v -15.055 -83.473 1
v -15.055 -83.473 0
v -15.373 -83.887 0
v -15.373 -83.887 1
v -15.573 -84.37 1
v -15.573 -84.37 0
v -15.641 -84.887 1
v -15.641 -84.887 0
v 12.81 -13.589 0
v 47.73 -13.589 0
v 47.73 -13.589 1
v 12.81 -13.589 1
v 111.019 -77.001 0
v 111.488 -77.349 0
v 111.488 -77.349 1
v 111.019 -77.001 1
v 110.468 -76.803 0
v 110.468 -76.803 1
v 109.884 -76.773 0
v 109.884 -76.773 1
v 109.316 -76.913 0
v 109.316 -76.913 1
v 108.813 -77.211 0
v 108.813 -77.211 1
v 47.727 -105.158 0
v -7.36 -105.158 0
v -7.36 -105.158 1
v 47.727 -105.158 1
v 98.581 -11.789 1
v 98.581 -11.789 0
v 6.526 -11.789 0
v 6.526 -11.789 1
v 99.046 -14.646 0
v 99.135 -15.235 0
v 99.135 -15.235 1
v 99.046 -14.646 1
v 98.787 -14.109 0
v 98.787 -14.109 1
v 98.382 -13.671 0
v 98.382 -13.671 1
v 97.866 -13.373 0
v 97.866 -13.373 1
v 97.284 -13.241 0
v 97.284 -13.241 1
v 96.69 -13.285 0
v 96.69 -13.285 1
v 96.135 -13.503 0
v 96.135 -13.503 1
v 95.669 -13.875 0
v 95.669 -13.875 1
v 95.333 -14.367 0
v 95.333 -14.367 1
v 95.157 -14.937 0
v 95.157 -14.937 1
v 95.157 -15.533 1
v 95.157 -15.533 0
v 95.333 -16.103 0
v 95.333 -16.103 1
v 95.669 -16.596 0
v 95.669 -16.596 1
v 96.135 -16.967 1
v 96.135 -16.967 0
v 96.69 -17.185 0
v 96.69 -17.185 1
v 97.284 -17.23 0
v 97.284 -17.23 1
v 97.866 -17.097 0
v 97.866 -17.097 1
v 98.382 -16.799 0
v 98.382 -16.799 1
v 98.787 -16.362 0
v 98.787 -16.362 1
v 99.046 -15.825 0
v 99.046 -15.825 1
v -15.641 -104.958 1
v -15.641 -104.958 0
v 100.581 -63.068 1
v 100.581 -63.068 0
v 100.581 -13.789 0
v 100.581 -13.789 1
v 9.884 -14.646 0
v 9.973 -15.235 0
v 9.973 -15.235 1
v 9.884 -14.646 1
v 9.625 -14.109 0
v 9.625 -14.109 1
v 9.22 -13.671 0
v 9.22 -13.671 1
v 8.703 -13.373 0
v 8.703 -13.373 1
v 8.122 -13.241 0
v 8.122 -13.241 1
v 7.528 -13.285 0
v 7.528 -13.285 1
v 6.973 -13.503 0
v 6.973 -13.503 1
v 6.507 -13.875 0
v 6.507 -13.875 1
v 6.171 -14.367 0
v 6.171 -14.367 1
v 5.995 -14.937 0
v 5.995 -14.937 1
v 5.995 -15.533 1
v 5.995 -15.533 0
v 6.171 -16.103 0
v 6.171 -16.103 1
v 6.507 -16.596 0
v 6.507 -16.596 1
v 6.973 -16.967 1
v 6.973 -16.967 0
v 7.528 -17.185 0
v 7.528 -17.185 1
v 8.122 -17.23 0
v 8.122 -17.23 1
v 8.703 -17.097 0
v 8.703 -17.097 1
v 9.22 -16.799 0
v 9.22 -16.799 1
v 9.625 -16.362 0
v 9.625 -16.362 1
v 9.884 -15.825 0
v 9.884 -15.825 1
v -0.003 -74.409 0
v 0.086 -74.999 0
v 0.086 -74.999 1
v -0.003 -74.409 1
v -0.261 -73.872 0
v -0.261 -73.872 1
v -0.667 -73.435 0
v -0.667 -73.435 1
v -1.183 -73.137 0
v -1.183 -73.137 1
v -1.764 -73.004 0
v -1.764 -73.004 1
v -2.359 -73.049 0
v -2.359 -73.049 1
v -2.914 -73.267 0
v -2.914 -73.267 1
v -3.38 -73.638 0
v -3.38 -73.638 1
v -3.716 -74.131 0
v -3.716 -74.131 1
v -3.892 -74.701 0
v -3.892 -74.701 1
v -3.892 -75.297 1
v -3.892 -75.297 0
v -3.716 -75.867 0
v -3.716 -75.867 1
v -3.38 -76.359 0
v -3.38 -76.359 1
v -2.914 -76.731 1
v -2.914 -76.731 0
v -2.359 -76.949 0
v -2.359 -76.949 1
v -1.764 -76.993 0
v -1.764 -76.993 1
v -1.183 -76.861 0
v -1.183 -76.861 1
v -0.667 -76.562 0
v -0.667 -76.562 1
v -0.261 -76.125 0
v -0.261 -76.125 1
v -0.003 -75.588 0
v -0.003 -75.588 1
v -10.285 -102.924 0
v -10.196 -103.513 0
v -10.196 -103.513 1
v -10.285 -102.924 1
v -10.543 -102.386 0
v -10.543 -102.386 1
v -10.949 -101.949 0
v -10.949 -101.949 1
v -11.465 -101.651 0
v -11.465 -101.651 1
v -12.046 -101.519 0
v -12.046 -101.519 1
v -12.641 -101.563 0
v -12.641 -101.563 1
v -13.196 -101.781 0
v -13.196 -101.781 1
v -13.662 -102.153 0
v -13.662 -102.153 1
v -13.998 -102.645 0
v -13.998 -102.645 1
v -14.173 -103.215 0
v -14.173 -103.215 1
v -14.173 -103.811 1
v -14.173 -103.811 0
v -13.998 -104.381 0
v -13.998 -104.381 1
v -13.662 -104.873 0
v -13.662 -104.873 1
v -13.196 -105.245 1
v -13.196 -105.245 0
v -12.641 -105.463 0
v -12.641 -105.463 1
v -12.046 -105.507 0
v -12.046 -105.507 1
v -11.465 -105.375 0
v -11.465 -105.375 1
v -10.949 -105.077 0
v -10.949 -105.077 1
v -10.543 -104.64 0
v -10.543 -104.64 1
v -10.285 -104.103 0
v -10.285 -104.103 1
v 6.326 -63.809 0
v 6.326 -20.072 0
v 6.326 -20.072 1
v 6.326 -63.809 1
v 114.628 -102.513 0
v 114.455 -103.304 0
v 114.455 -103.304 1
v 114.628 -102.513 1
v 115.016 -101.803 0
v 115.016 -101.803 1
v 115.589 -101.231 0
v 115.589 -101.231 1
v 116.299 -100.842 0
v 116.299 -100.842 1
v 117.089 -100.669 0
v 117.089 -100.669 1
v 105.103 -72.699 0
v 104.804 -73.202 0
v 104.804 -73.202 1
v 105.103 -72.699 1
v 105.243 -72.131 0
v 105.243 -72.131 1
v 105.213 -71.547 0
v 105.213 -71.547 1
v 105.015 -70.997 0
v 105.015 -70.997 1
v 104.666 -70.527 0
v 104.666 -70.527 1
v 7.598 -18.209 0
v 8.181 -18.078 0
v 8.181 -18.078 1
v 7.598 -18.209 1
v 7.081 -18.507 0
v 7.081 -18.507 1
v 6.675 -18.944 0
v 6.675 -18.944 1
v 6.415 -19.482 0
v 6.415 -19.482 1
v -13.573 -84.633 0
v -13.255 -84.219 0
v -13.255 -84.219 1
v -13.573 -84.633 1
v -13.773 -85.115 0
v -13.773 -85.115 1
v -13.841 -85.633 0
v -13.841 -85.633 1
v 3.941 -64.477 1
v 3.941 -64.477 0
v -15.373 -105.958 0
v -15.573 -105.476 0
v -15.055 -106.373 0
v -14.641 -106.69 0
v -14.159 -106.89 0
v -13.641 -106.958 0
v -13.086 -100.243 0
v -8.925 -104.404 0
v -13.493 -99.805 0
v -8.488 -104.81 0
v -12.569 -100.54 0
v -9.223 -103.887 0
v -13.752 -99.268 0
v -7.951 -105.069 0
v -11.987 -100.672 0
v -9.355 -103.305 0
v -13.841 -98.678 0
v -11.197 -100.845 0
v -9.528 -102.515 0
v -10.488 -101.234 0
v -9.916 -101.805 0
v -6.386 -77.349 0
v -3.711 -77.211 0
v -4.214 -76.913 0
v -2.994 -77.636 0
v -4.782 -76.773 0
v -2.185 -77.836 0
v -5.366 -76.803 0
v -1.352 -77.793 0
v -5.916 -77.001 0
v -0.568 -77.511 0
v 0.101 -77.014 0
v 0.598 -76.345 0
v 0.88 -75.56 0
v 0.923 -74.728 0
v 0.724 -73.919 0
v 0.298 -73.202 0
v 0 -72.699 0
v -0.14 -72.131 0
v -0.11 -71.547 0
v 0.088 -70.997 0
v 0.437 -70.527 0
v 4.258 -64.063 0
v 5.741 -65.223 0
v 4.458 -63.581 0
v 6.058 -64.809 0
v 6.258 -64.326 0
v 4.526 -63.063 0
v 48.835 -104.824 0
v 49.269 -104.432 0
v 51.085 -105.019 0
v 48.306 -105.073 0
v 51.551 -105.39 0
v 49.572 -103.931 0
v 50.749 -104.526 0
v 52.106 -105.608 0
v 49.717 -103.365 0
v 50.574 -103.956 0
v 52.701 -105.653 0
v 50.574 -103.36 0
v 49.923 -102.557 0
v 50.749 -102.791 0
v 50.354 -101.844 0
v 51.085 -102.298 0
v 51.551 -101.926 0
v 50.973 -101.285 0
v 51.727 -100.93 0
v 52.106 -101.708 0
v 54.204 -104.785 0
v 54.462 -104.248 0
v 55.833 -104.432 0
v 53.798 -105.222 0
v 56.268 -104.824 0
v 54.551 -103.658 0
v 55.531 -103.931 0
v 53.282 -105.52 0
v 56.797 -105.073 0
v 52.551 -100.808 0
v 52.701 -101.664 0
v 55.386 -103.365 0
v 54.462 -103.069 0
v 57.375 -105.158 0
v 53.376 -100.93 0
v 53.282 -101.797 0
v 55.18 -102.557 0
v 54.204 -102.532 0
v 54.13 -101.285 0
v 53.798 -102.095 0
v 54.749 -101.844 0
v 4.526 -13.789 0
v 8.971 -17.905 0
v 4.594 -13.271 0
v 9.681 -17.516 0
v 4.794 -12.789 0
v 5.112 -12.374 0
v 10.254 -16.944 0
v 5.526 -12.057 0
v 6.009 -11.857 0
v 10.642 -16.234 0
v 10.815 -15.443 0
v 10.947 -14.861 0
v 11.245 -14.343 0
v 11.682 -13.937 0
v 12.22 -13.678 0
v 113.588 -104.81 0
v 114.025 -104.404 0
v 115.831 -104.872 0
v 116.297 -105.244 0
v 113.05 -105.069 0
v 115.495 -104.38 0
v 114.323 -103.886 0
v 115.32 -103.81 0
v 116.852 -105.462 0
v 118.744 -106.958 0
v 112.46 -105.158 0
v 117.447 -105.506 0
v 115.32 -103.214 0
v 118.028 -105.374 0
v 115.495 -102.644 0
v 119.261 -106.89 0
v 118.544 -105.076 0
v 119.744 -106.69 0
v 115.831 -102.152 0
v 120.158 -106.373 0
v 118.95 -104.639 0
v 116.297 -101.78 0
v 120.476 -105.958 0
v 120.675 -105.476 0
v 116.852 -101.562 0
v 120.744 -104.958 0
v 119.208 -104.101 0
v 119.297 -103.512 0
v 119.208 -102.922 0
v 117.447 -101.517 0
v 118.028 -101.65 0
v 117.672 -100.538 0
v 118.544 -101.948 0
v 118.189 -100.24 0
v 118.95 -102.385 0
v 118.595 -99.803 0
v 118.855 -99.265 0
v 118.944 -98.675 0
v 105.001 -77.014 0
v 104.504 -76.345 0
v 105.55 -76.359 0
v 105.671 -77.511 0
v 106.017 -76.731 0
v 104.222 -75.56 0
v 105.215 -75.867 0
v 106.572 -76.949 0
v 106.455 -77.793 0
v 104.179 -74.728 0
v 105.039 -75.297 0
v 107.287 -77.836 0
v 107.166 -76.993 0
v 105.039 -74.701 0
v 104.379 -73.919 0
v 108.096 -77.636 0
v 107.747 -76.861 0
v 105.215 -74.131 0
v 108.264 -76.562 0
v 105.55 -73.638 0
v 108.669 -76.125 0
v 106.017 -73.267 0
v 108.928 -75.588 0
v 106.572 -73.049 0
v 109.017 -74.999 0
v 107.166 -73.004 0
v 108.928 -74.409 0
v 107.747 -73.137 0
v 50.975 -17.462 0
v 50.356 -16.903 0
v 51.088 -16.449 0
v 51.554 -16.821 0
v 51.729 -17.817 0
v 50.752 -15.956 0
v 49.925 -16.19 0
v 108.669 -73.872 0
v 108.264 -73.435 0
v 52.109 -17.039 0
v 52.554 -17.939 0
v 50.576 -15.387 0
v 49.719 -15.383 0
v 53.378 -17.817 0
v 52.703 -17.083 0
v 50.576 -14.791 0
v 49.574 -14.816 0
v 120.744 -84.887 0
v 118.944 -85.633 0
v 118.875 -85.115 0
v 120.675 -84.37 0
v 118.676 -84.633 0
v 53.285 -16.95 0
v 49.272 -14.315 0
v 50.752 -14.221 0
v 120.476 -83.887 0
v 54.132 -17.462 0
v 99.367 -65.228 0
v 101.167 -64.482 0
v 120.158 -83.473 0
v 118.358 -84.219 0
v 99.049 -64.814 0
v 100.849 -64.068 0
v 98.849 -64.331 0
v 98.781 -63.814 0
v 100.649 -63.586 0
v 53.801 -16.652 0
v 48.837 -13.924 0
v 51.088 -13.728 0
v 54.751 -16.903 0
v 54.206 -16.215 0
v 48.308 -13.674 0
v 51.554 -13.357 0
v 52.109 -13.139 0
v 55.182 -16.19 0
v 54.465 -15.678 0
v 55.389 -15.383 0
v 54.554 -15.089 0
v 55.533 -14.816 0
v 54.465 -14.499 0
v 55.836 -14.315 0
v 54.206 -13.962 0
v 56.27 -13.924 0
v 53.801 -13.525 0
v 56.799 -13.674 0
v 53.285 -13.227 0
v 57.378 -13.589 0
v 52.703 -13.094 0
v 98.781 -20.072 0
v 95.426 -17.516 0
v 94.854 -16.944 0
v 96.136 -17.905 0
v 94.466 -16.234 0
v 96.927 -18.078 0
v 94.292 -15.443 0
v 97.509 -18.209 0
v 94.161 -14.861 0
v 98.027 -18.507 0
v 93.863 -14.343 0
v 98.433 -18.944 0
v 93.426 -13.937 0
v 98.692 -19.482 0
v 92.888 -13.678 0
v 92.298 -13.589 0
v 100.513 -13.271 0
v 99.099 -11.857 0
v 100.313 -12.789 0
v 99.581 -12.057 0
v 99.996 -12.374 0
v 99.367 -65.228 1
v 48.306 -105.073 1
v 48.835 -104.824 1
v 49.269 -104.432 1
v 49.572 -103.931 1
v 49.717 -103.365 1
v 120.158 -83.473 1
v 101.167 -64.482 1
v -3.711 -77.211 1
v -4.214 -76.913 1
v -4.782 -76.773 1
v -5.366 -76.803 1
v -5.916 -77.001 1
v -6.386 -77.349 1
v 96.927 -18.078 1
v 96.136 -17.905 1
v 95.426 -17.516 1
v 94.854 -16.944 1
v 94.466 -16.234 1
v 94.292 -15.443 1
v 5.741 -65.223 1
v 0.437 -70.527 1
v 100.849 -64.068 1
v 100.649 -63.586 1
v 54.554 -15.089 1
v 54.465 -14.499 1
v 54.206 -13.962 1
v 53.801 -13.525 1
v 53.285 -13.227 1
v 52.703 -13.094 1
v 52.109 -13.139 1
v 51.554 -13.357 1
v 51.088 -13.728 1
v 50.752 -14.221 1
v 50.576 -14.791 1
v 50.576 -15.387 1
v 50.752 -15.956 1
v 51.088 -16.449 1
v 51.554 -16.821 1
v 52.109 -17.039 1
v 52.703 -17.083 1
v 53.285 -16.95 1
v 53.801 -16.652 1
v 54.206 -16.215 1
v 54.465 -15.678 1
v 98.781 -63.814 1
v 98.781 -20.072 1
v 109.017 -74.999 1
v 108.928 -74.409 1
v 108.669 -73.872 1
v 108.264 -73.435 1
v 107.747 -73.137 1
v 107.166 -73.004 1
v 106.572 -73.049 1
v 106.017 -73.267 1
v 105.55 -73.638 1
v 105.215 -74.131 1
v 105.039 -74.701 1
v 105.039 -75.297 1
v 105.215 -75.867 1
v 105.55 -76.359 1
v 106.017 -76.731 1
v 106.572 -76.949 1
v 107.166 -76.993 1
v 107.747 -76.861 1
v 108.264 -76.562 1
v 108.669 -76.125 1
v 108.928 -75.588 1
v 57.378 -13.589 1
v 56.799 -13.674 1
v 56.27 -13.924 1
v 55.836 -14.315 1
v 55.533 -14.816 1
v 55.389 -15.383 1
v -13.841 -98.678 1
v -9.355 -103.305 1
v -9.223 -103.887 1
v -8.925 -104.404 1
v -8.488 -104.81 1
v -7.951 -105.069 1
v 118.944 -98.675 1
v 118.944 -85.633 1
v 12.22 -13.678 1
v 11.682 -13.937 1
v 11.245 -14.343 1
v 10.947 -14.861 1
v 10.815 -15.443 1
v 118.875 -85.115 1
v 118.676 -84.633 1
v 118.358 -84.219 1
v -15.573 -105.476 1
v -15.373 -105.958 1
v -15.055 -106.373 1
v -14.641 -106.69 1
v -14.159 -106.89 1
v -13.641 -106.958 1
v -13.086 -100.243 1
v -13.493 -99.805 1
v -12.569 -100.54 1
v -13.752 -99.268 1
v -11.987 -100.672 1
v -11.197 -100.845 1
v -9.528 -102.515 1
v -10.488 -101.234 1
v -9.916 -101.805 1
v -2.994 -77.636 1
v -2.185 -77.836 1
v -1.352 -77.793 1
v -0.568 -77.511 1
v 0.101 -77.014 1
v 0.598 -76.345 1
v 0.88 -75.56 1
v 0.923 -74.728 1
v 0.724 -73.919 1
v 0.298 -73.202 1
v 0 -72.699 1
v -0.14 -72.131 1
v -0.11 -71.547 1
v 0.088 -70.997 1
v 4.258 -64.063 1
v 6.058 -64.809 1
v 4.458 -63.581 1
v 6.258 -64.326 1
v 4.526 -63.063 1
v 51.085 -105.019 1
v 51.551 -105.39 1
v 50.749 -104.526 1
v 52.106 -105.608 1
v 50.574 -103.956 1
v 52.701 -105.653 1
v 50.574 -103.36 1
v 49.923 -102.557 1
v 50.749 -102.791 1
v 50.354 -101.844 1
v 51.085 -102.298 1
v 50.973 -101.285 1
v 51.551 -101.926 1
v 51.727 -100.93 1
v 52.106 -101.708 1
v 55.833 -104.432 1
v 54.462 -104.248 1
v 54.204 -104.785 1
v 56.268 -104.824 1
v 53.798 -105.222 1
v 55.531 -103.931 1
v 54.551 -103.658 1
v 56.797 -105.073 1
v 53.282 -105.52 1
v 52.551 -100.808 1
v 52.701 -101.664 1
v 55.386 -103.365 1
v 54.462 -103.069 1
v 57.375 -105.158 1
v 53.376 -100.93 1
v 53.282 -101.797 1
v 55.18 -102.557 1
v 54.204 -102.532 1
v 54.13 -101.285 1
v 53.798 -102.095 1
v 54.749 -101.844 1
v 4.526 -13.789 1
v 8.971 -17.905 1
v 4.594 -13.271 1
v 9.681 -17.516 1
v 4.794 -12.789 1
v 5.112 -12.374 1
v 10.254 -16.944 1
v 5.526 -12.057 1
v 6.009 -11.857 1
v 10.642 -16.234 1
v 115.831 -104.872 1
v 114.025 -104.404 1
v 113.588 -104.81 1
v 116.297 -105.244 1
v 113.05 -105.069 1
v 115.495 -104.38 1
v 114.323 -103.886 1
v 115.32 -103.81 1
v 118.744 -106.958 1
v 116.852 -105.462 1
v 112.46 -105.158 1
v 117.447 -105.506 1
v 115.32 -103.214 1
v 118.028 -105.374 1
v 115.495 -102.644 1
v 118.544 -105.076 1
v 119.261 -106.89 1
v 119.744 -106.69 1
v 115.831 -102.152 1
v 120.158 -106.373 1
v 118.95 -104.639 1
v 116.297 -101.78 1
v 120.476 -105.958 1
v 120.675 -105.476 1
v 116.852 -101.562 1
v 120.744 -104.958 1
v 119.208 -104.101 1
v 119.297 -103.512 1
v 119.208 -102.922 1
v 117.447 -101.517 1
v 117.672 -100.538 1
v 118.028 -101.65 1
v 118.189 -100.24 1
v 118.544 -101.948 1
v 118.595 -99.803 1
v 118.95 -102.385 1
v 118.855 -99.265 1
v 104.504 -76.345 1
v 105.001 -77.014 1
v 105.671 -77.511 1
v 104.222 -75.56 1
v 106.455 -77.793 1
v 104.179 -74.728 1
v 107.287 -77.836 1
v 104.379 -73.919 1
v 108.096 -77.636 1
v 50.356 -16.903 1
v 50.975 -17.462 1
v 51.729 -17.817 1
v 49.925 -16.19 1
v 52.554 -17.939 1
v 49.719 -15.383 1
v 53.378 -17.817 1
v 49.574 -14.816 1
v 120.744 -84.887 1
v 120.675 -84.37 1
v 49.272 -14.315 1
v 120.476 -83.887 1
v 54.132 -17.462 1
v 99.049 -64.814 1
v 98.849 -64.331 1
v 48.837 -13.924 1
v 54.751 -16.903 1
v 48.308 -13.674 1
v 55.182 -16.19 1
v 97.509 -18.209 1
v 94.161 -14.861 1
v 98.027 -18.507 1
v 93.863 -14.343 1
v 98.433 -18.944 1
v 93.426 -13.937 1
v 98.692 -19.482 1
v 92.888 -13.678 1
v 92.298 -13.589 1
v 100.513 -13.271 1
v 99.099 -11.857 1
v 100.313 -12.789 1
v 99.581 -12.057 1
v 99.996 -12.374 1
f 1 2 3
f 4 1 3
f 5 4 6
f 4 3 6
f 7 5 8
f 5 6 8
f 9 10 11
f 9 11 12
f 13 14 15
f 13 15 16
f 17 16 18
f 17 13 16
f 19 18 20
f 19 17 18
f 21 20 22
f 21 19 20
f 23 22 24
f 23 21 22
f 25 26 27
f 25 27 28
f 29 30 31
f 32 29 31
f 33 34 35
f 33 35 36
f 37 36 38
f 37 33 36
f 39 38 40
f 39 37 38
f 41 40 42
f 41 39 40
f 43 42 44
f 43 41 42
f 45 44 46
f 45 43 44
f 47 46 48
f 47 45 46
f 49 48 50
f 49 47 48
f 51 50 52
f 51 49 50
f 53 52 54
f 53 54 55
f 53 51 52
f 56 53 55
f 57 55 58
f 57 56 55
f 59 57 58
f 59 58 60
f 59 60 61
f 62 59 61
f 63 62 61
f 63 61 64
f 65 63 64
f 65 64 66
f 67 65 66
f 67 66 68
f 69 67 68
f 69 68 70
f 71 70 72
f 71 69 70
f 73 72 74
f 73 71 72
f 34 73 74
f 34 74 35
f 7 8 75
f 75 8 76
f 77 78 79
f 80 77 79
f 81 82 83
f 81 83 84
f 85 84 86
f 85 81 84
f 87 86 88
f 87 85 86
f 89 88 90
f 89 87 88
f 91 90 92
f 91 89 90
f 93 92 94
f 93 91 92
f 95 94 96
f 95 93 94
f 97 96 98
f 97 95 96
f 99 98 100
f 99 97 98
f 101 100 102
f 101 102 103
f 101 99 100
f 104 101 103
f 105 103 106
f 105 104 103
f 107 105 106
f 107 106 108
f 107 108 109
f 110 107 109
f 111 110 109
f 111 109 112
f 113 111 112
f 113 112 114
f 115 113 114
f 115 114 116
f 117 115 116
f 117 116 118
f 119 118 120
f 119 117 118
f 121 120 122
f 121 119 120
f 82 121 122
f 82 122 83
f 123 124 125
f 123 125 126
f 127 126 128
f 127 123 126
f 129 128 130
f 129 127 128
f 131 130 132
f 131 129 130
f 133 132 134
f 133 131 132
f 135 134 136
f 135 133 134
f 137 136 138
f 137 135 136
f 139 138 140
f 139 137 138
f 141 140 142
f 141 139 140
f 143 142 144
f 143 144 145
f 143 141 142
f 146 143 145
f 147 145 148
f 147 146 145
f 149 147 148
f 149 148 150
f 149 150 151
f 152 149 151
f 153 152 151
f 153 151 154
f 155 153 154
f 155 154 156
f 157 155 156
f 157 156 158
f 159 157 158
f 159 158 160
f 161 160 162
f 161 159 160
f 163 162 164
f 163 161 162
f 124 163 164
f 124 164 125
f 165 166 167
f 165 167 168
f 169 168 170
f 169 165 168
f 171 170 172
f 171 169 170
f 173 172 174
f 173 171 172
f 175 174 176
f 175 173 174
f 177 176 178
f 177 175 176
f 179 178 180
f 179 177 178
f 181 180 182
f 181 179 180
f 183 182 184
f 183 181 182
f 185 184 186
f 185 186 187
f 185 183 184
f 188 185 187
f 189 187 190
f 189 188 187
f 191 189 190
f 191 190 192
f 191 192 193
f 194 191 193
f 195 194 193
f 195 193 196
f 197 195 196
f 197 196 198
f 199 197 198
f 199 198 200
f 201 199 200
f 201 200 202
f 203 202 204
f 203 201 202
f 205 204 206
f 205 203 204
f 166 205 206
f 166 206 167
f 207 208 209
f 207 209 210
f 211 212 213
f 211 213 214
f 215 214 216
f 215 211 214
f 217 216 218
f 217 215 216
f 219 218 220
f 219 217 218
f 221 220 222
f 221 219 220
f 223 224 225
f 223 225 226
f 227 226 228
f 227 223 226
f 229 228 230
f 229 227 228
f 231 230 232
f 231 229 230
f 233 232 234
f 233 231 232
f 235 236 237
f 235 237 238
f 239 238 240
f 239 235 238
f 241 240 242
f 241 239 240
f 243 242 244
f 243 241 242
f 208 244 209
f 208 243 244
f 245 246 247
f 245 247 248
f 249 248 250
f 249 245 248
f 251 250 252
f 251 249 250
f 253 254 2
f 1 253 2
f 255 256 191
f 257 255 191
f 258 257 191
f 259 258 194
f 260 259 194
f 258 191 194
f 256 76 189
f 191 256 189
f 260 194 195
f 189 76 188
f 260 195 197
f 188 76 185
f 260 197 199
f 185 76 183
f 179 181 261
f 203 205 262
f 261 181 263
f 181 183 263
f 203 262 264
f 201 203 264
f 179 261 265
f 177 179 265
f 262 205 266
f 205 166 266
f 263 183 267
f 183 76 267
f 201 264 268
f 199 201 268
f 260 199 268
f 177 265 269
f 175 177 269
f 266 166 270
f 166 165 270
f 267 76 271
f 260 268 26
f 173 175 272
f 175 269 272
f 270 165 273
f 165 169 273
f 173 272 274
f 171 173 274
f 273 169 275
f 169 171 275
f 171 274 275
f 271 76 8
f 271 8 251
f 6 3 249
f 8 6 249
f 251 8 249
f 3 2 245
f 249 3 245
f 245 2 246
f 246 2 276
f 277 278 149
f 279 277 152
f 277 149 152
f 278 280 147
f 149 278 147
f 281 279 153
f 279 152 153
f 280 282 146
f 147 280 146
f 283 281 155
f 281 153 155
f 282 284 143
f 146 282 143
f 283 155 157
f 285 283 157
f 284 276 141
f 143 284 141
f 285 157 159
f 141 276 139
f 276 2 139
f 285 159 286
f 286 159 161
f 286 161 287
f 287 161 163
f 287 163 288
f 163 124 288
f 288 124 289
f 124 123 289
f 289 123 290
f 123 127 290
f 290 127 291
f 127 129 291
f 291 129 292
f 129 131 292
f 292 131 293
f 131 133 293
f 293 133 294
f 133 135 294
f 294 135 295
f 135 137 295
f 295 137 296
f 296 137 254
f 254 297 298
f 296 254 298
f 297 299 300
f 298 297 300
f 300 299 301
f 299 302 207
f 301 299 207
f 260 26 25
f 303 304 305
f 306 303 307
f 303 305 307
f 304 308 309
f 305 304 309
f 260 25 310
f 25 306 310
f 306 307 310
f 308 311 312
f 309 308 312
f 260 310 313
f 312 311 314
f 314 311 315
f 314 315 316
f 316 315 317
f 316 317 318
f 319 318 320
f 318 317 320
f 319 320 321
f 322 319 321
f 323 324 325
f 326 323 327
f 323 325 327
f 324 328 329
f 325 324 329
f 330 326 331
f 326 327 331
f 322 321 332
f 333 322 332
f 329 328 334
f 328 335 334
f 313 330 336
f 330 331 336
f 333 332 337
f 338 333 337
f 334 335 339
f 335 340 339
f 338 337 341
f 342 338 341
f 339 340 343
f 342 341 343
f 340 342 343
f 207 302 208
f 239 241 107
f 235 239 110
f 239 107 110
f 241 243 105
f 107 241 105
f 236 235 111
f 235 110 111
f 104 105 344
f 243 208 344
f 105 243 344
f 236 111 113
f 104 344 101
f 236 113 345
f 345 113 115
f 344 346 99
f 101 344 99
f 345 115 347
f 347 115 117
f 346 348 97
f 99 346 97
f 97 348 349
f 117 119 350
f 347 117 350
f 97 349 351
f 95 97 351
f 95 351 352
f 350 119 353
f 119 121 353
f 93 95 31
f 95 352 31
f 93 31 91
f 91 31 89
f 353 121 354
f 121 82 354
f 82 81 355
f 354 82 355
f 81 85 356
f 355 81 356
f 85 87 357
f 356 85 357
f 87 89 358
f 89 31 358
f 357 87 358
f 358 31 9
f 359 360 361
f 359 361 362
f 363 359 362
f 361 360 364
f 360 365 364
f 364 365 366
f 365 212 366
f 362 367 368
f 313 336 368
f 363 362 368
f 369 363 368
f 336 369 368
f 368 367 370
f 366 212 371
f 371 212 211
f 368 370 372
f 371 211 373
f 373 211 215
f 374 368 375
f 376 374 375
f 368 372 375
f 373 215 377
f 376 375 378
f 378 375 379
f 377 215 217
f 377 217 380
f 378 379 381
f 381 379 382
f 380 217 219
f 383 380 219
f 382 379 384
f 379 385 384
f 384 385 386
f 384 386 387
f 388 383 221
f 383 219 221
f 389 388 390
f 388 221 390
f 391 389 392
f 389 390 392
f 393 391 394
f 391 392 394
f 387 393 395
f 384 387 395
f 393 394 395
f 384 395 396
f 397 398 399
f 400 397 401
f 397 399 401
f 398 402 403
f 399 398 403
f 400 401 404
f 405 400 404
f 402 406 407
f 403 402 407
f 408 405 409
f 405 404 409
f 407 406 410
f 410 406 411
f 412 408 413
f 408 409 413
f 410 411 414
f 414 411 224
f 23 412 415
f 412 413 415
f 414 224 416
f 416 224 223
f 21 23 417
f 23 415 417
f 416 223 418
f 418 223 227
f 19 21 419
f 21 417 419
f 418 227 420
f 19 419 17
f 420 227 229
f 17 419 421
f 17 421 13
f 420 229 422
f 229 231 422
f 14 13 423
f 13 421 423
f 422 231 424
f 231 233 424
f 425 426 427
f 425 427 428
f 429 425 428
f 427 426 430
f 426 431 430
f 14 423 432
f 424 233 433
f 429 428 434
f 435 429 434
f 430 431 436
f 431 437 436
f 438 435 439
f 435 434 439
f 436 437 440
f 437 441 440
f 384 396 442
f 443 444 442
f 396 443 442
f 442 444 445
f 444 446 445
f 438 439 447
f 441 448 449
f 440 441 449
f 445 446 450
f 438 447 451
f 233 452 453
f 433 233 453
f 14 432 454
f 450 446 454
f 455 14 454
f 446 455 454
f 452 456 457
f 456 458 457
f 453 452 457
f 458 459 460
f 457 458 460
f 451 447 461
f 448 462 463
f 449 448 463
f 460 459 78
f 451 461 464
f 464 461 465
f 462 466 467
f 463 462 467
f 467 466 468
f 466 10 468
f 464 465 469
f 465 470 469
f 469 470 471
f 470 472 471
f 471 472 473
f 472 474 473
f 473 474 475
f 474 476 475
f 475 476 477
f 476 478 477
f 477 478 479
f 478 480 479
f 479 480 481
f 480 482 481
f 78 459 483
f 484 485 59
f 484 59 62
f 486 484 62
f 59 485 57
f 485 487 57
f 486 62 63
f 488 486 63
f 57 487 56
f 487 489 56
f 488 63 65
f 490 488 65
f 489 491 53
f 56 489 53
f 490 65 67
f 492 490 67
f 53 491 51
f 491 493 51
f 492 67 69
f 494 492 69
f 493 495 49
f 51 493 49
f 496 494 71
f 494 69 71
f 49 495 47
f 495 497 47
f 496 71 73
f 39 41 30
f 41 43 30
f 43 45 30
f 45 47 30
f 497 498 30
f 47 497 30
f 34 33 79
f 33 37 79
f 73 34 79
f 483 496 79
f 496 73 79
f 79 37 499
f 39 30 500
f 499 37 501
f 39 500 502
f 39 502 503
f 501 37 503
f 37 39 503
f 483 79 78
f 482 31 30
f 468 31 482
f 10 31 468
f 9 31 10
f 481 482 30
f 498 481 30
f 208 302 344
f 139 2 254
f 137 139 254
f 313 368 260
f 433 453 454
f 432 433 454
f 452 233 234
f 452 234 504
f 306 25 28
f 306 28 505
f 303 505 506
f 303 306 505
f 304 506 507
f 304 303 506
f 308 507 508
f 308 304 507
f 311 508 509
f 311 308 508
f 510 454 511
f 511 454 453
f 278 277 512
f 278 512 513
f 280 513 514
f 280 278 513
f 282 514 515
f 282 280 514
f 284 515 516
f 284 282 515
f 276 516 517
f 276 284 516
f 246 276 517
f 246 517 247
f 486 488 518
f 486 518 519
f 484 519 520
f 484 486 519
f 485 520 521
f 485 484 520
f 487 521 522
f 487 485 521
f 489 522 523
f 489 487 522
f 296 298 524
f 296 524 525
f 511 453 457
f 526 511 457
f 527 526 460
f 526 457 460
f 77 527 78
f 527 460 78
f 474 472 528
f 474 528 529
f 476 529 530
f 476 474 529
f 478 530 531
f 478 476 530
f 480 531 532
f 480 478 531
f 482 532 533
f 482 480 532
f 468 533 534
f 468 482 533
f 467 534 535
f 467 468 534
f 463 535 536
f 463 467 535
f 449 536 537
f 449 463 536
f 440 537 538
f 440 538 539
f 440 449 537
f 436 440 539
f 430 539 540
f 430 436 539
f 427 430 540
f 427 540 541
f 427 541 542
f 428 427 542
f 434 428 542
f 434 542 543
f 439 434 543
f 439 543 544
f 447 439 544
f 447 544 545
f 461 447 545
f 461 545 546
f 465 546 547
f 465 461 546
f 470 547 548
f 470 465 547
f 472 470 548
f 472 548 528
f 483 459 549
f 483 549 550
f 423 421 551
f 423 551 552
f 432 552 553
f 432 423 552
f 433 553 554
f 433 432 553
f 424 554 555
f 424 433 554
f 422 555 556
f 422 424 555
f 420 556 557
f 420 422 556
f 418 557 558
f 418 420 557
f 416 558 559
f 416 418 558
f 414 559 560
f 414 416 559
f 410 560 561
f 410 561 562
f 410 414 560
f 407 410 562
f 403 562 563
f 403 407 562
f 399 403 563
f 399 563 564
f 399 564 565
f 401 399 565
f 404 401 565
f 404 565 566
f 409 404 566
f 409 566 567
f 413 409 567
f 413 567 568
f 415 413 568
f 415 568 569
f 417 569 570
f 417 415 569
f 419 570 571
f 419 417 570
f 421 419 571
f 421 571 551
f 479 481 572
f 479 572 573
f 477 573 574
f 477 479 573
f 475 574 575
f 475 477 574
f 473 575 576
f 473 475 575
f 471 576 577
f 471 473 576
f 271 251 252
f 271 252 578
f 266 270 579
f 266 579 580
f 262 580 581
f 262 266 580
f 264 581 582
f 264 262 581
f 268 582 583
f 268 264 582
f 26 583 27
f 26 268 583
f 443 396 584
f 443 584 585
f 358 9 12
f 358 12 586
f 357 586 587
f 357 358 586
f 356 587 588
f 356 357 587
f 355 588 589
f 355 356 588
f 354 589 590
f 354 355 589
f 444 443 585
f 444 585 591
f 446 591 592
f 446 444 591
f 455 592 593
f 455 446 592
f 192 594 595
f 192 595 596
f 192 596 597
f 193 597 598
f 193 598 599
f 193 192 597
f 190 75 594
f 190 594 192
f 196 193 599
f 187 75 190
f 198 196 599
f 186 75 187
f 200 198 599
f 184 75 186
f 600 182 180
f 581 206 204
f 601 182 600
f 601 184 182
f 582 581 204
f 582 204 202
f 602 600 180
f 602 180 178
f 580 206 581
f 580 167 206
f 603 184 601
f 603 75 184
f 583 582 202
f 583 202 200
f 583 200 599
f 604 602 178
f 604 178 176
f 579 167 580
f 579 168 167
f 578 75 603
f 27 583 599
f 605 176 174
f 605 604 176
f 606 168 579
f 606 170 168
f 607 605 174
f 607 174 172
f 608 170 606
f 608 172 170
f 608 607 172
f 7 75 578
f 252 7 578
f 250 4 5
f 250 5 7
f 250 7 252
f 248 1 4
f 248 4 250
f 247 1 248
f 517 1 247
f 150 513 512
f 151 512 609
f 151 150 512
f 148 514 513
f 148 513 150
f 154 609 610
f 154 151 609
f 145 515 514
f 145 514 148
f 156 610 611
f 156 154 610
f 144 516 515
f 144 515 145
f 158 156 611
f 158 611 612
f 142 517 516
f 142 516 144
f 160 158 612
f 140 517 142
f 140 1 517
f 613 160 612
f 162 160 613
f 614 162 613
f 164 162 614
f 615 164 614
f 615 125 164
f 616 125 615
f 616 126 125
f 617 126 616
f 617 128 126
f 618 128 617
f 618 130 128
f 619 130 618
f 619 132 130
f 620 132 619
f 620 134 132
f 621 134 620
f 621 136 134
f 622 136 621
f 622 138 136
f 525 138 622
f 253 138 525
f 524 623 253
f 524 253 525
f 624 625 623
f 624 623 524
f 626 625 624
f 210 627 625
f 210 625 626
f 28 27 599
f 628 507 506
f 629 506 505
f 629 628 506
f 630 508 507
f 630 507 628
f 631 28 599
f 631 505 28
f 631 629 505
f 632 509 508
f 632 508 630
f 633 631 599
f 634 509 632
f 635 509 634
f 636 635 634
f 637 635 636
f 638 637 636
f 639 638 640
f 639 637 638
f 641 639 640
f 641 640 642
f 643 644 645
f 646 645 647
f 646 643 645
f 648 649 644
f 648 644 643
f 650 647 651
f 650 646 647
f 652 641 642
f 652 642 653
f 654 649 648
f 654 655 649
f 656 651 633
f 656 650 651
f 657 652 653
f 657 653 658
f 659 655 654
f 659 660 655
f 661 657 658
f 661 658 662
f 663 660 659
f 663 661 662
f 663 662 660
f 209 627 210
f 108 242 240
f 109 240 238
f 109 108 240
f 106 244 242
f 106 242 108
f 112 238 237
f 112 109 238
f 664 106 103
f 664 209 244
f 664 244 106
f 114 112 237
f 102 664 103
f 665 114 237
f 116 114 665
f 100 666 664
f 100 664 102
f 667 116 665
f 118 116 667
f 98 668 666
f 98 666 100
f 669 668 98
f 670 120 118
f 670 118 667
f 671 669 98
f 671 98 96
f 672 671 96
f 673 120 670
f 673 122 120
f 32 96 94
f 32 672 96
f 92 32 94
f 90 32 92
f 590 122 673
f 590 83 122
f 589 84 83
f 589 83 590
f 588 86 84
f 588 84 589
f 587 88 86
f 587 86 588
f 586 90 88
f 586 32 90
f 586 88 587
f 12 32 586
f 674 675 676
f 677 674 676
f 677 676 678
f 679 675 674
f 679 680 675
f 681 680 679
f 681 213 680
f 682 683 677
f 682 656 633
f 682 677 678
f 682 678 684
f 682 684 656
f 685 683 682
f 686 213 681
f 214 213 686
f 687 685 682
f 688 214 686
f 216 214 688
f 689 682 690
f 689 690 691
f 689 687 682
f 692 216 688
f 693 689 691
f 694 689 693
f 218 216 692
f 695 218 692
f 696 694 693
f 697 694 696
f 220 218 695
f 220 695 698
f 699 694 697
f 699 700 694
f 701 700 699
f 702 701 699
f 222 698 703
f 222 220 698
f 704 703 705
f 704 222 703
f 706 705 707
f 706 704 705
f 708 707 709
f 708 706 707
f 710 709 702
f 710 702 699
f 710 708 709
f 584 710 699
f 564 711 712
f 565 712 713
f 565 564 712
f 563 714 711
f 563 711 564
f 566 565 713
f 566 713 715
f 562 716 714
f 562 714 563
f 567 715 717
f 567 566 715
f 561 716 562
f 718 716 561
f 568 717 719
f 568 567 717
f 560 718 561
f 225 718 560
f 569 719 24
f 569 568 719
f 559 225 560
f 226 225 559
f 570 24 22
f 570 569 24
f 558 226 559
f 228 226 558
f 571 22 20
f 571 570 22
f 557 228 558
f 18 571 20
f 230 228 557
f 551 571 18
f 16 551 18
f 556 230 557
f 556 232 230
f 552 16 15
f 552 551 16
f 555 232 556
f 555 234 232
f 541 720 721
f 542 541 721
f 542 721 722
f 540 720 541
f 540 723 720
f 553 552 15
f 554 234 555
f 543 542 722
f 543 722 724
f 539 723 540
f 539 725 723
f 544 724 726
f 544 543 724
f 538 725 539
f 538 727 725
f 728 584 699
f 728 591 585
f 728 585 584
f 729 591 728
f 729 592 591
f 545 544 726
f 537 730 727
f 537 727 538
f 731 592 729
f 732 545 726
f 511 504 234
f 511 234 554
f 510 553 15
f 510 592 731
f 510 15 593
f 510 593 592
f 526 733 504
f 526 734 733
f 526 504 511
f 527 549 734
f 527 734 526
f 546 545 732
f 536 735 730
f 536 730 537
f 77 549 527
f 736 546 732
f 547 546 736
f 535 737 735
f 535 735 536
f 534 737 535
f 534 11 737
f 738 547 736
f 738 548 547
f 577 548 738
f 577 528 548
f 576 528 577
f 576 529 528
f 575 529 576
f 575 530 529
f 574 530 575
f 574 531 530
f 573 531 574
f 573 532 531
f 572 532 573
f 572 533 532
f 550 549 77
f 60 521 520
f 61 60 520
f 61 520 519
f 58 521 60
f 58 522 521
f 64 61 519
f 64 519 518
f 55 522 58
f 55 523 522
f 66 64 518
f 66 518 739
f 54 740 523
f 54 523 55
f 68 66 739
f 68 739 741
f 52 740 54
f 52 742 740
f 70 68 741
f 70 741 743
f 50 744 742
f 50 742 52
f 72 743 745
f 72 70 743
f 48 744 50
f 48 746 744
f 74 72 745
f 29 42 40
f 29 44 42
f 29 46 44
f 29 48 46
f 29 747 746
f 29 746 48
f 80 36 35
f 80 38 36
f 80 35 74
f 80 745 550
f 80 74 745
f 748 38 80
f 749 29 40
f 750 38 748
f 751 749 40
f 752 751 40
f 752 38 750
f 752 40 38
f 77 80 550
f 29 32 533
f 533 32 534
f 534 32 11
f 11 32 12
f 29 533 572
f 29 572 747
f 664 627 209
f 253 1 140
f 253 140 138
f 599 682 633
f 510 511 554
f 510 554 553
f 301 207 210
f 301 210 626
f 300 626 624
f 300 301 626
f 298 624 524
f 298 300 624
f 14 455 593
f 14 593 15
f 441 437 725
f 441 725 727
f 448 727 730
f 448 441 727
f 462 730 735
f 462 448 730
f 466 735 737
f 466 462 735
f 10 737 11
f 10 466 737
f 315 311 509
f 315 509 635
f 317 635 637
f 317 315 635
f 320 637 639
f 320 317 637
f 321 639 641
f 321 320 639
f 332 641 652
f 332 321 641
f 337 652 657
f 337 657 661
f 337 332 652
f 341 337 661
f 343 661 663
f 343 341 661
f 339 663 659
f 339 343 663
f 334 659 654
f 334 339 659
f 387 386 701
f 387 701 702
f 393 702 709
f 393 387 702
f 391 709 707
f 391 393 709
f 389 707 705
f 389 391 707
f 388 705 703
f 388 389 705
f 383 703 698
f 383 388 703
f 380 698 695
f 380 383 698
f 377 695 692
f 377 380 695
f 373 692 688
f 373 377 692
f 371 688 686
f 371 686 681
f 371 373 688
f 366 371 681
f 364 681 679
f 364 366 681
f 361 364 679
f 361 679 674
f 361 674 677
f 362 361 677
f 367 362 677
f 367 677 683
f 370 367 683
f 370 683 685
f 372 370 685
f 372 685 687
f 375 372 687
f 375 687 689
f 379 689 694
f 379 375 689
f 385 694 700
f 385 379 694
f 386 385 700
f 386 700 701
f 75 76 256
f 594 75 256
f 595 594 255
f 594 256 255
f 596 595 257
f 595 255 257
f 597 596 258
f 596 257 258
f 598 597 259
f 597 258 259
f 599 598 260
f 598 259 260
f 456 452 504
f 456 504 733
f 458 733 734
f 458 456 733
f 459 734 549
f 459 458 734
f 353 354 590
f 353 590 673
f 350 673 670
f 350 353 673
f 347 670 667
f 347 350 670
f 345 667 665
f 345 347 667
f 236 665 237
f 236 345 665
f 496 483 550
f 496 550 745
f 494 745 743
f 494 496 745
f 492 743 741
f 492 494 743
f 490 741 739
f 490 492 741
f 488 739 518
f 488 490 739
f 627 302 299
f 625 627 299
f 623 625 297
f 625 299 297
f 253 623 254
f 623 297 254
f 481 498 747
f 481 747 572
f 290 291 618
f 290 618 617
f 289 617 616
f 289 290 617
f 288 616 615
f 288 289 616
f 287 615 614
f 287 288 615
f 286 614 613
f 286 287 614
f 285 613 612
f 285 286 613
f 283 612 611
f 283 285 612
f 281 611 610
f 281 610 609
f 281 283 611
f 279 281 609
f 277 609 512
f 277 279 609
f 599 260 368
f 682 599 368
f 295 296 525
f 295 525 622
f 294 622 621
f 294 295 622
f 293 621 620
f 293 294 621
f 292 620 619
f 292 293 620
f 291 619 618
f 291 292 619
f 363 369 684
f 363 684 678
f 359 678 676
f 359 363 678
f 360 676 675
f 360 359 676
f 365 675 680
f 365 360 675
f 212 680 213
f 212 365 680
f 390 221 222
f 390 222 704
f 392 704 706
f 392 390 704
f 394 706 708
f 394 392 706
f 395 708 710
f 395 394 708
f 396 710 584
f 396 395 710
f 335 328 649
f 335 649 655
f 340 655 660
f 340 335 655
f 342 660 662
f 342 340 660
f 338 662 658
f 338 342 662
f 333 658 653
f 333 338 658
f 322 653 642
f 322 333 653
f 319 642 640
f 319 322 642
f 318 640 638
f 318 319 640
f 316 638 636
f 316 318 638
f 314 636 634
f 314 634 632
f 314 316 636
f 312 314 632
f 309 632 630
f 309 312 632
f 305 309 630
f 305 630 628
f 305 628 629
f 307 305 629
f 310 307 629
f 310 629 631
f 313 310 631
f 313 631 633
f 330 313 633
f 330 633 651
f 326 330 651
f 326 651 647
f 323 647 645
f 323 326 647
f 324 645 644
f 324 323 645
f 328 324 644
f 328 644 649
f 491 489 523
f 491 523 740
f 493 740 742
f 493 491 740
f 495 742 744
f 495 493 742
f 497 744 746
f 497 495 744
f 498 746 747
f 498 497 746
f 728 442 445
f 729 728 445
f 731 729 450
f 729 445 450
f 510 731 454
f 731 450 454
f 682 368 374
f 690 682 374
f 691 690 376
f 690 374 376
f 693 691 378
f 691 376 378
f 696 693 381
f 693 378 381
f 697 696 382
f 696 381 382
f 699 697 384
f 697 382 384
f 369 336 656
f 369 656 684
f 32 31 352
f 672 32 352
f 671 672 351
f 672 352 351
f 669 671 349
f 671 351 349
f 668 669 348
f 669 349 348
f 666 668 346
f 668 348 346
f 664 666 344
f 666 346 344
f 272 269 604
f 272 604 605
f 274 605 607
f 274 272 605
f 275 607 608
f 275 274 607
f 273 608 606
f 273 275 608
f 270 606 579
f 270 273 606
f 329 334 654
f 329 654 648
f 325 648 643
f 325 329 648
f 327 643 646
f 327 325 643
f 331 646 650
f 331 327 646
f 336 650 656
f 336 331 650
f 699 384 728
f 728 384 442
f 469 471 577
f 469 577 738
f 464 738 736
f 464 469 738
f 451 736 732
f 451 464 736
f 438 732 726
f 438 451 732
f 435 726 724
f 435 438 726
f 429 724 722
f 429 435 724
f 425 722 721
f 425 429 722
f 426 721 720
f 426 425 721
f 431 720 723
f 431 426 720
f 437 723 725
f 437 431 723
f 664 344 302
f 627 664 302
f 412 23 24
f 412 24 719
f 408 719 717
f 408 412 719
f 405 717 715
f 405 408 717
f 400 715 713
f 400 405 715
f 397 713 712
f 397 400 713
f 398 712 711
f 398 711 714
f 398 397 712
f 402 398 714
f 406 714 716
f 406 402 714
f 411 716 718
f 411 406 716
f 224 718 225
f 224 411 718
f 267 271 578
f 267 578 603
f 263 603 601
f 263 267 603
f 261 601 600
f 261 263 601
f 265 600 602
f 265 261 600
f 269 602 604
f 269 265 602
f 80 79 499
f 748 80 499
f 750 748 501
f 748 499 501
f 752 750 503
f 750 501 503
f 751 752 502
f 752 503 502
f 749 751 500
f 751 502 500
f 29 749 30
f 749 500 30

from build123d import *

# Parameters (mm, degrees)
SKETCH1_R           = 2
BOSS_EXTRUDE1_DEPTH = 1


with BuildPart() as part:
    # Sketch1 → Boss-Extrude1 (new body)
    with BuildSketch(Plane.XY):
        with BuildLine():
            Line((100.581340861, -63.068209116), (100.581340861, -13.788708514))
            ThreePointArc((100.581340861, -13.788708514), (99.995554423, -12.374494952), (98.581340861, -11.788708514))
            Line((98.581340861, -11.788708514), (6.526340861, -11.788708514))
            ThreePointArc((6.526340861, -11.788708514), (5.112127298, -12.374494952), (4.526340861, -13.788708514))
            Line((4.526340861, -13.788708514), (4.526340861, -63.063209116))
            ThreePointArc((4.526340861, -63.063209116), (4.374099926, -63.828575981), (3.940554423, -64.477422679))
            Line((3.940554423, -64.477422679), (-15.055177547, -83.473154649))
            ThreePointArc((-15.055177547, -83.473154649), (-15.48872305, -84.122001347), (-15.640963985, -84.887368211))
            Line((-15.640963985, -84.887368211), (-15.640963985, -104.958318205))
            ThreePointArc((-15.640963985, -104.958318205), (-15.055177547, -106.372531767), (-13.640963985, -106.958318205))
            Line((-13.640963985, -106.958318205), (118.743645706, -106.958318205))
            ThreePointArc((118.743645706, -106.958318205), (120.157859269, -106.372531767), (120.743645706, -104.958318205))
            Line((120.743645706, -104.958318205), (120.743645706, -84.887368211))
            ThreePointArc((120.743645706, -84.887368211), (120.591404771, -84.122001347), (120.157859269, -83.473154649))
            Line((120.157859269, -83.473154649), (101.167127298, -64.482422679))
            ThreePointArc((101.167127298, -64.482422679), (100.733581796, -63.833575981), (100.581340861, -63.068209116))
        make_face()
        with Locations((-12.195717461, -103.513071681)):
            Circle(SKETCH1_R, mode=Mode.SUBTRACT)
        with Locations((52.551340861, -103.658318205)):
            Circle(SKETCH1_R, mode=Mode.SUBTRACT)
        with Locations((117.297199097, -103.511871596)):
            Circle(SKETCH1_R, mode=Mode.SUBTRACT)
        with Locations((107.016568327, -74.998768464)):
            Circle(SKETCH1_R, mode=Mode.SUBTRACT)
        with Locations((-1.913886606, -74.998768464)):
            Circle(SKETCH1_R, mode=Mode.SUBTRACT)
        with Locations((7.97278747, -15.235155124)):
            Circle(SKETCH1_R, mode=Mode.SUBTRACT)
        with Locations((52.553840861, -15.088708514)):
            Circle(SKETCH1_R, mode=Mode.SUBTRACT)
        with Locations((97.134894251, -15.235155124)):
            Circle(SKETCH1_R, mode=Mode.SUBTRACT)
        with BuildLine():
            Line((98.781340861, -63.813793529), (98.781340861, -20.07225136))
            ThreePointArc((98.781340861, -20.07225136), (98.246194168, -18.710559476), (96.927136073, -18.0775725))
            ThreePointArc((96.927136073, -18.0775725), (95.119639925, -17.25040945), (94.292476875, -15.442913302))
            ThreePointArc((94.292476875, -15.442913302), (93.659489899, -14.123855207), (92.297798015, -13.588708514))
            Line((92.297798015, -13.588708514), (57.377998818, -13.588708514))
            ThreePointArc((57.377998818, -13.588708514), (56.03866524, -14.103385126), (55.388655331, -15.382522947))
            ThreePointArc((55.388655331, -15.382522947), (52.553840861, -17.938708514), (49.719026391, -15.382522947))
            ThreePointArc((49.719026391, -15.382522947), (49.069016481, -14.103385126), (47.729682903, -13.588708514))
            Line((47.729682903, -13.588708514), (12.809883707, -13.588708514))
            ThreePointArc((12.809883707, -13.588708514), (11.448191822, -14.123855207), (10.815204846, -15.442913302))
            ThreePointArc((10.815204846, -15.442913302), (9.988041797, -17.25040945), (8.180545648, -18.0775725))
            ThreePointArc((8.180545648, -18.0775725), (6.861487553, -18.710559476), (6.326340861, -20.07225136))
            Line((6.326340861, -20.07225136), (6.326340861, -63.808793529))
            ThreePointArc((6.326340861, -63.808793529), (6.174099926, -64.574160393), (5.740554423, -65.223007091))
            Line((5.740554423, -65.223007091), (0.436648028, -70.526913486))
            ThreePointArc((0.436648028, -70.526913486), (-0.146472505, -71.837896664), (0.298388107, -73.202010106))
            ThreePointArc((0.298388107, -73.202010106), (0.101367721, -77.01402279), (-3.710644963, -77.211043177))
            ThreePointArc((-3.710644963, -77.211043177), (-5.074758405, -76.766182564), (-6.385741583, -77.349303097))
            Line((-6.385741583, -77.349303097), (-13.255177547, -84.218739061))
            ThreePointArc((-13.255177547, -84.218739061), (-13.68872305, -84.867585759), (-13.840963985, -85.632952624))
            Line((-13.840963985, -85.632952624), (-13.840963985, -98.677765048))
            ThreePointArc((-13.840963985, -98.677765048), (-13.306003678, -100.039256399), (-11.987305288, -100.672403919))
            ThreePointArc((-11.987305288, -100.672403919), (-10.18166322, -101.49901744), (-9.355049698, -103.304659508))
            ThreePointArc((-9.355049698, -103.304659508), (-8.721902178, -104.623357898), (-7.360410828, -105.158318205))
            Line((-7.360410828, -105.158318205), (47.727182903, -105.158318205))
            ThreePointArc((47.727182903, -105.158318205), (49.066516481, -104.643641593), (49.716526391, -103.364503772))
            ThreePointArc((49.716526391, -103.364503772), (52.551340861, -100.808318205), (55.386155331, -103.364503772))
            ThreePointArc((55.386155331, -103.364503772), (56.03616524, -104.643641593), (57.375498818, -105.158318205))
            Line((57.375498818, -105.158318205), (112.46010286, -105.158318205))
            ThreePointArc((112.46010286, -105.158318205), (113.821794745, -104.623171513), (114.454781721, -103.304113418))
            ThreePointArc((114.454781721, -103.304113418), (115.28194477, -101.496617269), (117.089440919, -100.66945422))
            ThreePointArc((117.089440919, -100.66945422), (118.408499014, -100.036467243), (118.943645706, -98.674775359))
            Line((118.943645706, -98.674775359), (118.943645706, -85.632952624))
            ThreePointArc((118.943645706, -85.632952624), (118.791404771, -84.867585759), (118.357859269, -84.218739061))
            Line((118.357859269, -84.218739061), (111.488423304, -77.349303097))
            ThreePointArc((111.488423304, -77.349303097), (110.177440127, -76.766182564), (108.813326684, -77.211043177))
            ThreePointArc((108.813326684, -77.211043177), (105.001314001, -77.01402279), (104.804293614, -73.202010106))
            ThreePointArc((104.804293614, -73.202010106), (105.249154227, -71.837896664), (104.666033694, -70.526913486))
            Line((104.666033694, -70.526913486), (99.367127298, -65.228007091))
            ThreePointArc((99.367127298, -65.228007091), (98.933581796, -64.579160393), (98.781340861, -63.813793529))
        make_face(mode=Mode.SUBTRACT)
    extrude(amount=BOSS_EXTRUDE1_DEPTH)


solid = part.part
